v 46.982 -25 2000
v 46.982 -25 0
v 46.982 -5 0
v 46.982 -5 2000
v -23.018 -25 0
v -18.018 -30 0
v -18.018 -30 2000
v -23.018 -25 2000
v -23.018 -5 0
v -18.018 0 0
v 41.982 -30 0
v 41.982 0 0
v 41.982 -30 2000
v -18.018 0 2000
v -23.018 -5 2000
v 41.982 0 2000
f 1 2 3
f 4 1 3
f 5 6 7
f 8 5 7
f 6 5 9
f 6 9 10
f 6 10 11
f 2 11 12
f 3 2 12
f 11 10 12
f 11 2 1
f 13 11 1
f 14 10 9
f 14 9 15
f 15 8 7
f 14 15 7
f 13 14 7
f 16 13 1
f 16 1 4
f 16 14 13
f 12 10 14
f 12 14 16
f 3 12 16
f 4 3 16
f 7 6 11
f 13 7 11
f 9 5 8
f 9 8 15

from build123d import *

# Parameters (mm, degrees)
F0_W     = 70
F0_H     = 30
F1_DEPTH = 2000
F2_SIZE  = 5
F3_DEPTH = 1047


with BuildPart() as f1:
    # F0 (on Top) → F1 (new body)
    with BuildSketch(Plane.XY):
        with Locations((11.981502, -15)):
            Rectangle(F0_W, F0_H)
    extrude(amount=F1_DEPTH)

    # F2
    f2_edges = [f1.edges().sort_by_distance(p)[0] for p in [
        (-23.018498, -30, 1000),
        (46.981502, -30, 1000),
        (-23.018498, 0, 1000),
        (46.981502, 0, 1000),
    ]]
    chamfer(f2_edges, length=F2_SIZE)

    # F1_face (on face) → F3 (join)
    with BuildSketch(Plane(origin=(11.981502, -15, 2000), x_dir=(1, 0, 0), z_dir=(0, 0, 1))):
        Polygon((30, 15), (-30, 15), (-35, 10), (-35, -10), (-30, -15), (30, -15), (35, -10), (35, 10), align=None)
    extrude(amount=-F3_DEPTH)


solid = f1.part
